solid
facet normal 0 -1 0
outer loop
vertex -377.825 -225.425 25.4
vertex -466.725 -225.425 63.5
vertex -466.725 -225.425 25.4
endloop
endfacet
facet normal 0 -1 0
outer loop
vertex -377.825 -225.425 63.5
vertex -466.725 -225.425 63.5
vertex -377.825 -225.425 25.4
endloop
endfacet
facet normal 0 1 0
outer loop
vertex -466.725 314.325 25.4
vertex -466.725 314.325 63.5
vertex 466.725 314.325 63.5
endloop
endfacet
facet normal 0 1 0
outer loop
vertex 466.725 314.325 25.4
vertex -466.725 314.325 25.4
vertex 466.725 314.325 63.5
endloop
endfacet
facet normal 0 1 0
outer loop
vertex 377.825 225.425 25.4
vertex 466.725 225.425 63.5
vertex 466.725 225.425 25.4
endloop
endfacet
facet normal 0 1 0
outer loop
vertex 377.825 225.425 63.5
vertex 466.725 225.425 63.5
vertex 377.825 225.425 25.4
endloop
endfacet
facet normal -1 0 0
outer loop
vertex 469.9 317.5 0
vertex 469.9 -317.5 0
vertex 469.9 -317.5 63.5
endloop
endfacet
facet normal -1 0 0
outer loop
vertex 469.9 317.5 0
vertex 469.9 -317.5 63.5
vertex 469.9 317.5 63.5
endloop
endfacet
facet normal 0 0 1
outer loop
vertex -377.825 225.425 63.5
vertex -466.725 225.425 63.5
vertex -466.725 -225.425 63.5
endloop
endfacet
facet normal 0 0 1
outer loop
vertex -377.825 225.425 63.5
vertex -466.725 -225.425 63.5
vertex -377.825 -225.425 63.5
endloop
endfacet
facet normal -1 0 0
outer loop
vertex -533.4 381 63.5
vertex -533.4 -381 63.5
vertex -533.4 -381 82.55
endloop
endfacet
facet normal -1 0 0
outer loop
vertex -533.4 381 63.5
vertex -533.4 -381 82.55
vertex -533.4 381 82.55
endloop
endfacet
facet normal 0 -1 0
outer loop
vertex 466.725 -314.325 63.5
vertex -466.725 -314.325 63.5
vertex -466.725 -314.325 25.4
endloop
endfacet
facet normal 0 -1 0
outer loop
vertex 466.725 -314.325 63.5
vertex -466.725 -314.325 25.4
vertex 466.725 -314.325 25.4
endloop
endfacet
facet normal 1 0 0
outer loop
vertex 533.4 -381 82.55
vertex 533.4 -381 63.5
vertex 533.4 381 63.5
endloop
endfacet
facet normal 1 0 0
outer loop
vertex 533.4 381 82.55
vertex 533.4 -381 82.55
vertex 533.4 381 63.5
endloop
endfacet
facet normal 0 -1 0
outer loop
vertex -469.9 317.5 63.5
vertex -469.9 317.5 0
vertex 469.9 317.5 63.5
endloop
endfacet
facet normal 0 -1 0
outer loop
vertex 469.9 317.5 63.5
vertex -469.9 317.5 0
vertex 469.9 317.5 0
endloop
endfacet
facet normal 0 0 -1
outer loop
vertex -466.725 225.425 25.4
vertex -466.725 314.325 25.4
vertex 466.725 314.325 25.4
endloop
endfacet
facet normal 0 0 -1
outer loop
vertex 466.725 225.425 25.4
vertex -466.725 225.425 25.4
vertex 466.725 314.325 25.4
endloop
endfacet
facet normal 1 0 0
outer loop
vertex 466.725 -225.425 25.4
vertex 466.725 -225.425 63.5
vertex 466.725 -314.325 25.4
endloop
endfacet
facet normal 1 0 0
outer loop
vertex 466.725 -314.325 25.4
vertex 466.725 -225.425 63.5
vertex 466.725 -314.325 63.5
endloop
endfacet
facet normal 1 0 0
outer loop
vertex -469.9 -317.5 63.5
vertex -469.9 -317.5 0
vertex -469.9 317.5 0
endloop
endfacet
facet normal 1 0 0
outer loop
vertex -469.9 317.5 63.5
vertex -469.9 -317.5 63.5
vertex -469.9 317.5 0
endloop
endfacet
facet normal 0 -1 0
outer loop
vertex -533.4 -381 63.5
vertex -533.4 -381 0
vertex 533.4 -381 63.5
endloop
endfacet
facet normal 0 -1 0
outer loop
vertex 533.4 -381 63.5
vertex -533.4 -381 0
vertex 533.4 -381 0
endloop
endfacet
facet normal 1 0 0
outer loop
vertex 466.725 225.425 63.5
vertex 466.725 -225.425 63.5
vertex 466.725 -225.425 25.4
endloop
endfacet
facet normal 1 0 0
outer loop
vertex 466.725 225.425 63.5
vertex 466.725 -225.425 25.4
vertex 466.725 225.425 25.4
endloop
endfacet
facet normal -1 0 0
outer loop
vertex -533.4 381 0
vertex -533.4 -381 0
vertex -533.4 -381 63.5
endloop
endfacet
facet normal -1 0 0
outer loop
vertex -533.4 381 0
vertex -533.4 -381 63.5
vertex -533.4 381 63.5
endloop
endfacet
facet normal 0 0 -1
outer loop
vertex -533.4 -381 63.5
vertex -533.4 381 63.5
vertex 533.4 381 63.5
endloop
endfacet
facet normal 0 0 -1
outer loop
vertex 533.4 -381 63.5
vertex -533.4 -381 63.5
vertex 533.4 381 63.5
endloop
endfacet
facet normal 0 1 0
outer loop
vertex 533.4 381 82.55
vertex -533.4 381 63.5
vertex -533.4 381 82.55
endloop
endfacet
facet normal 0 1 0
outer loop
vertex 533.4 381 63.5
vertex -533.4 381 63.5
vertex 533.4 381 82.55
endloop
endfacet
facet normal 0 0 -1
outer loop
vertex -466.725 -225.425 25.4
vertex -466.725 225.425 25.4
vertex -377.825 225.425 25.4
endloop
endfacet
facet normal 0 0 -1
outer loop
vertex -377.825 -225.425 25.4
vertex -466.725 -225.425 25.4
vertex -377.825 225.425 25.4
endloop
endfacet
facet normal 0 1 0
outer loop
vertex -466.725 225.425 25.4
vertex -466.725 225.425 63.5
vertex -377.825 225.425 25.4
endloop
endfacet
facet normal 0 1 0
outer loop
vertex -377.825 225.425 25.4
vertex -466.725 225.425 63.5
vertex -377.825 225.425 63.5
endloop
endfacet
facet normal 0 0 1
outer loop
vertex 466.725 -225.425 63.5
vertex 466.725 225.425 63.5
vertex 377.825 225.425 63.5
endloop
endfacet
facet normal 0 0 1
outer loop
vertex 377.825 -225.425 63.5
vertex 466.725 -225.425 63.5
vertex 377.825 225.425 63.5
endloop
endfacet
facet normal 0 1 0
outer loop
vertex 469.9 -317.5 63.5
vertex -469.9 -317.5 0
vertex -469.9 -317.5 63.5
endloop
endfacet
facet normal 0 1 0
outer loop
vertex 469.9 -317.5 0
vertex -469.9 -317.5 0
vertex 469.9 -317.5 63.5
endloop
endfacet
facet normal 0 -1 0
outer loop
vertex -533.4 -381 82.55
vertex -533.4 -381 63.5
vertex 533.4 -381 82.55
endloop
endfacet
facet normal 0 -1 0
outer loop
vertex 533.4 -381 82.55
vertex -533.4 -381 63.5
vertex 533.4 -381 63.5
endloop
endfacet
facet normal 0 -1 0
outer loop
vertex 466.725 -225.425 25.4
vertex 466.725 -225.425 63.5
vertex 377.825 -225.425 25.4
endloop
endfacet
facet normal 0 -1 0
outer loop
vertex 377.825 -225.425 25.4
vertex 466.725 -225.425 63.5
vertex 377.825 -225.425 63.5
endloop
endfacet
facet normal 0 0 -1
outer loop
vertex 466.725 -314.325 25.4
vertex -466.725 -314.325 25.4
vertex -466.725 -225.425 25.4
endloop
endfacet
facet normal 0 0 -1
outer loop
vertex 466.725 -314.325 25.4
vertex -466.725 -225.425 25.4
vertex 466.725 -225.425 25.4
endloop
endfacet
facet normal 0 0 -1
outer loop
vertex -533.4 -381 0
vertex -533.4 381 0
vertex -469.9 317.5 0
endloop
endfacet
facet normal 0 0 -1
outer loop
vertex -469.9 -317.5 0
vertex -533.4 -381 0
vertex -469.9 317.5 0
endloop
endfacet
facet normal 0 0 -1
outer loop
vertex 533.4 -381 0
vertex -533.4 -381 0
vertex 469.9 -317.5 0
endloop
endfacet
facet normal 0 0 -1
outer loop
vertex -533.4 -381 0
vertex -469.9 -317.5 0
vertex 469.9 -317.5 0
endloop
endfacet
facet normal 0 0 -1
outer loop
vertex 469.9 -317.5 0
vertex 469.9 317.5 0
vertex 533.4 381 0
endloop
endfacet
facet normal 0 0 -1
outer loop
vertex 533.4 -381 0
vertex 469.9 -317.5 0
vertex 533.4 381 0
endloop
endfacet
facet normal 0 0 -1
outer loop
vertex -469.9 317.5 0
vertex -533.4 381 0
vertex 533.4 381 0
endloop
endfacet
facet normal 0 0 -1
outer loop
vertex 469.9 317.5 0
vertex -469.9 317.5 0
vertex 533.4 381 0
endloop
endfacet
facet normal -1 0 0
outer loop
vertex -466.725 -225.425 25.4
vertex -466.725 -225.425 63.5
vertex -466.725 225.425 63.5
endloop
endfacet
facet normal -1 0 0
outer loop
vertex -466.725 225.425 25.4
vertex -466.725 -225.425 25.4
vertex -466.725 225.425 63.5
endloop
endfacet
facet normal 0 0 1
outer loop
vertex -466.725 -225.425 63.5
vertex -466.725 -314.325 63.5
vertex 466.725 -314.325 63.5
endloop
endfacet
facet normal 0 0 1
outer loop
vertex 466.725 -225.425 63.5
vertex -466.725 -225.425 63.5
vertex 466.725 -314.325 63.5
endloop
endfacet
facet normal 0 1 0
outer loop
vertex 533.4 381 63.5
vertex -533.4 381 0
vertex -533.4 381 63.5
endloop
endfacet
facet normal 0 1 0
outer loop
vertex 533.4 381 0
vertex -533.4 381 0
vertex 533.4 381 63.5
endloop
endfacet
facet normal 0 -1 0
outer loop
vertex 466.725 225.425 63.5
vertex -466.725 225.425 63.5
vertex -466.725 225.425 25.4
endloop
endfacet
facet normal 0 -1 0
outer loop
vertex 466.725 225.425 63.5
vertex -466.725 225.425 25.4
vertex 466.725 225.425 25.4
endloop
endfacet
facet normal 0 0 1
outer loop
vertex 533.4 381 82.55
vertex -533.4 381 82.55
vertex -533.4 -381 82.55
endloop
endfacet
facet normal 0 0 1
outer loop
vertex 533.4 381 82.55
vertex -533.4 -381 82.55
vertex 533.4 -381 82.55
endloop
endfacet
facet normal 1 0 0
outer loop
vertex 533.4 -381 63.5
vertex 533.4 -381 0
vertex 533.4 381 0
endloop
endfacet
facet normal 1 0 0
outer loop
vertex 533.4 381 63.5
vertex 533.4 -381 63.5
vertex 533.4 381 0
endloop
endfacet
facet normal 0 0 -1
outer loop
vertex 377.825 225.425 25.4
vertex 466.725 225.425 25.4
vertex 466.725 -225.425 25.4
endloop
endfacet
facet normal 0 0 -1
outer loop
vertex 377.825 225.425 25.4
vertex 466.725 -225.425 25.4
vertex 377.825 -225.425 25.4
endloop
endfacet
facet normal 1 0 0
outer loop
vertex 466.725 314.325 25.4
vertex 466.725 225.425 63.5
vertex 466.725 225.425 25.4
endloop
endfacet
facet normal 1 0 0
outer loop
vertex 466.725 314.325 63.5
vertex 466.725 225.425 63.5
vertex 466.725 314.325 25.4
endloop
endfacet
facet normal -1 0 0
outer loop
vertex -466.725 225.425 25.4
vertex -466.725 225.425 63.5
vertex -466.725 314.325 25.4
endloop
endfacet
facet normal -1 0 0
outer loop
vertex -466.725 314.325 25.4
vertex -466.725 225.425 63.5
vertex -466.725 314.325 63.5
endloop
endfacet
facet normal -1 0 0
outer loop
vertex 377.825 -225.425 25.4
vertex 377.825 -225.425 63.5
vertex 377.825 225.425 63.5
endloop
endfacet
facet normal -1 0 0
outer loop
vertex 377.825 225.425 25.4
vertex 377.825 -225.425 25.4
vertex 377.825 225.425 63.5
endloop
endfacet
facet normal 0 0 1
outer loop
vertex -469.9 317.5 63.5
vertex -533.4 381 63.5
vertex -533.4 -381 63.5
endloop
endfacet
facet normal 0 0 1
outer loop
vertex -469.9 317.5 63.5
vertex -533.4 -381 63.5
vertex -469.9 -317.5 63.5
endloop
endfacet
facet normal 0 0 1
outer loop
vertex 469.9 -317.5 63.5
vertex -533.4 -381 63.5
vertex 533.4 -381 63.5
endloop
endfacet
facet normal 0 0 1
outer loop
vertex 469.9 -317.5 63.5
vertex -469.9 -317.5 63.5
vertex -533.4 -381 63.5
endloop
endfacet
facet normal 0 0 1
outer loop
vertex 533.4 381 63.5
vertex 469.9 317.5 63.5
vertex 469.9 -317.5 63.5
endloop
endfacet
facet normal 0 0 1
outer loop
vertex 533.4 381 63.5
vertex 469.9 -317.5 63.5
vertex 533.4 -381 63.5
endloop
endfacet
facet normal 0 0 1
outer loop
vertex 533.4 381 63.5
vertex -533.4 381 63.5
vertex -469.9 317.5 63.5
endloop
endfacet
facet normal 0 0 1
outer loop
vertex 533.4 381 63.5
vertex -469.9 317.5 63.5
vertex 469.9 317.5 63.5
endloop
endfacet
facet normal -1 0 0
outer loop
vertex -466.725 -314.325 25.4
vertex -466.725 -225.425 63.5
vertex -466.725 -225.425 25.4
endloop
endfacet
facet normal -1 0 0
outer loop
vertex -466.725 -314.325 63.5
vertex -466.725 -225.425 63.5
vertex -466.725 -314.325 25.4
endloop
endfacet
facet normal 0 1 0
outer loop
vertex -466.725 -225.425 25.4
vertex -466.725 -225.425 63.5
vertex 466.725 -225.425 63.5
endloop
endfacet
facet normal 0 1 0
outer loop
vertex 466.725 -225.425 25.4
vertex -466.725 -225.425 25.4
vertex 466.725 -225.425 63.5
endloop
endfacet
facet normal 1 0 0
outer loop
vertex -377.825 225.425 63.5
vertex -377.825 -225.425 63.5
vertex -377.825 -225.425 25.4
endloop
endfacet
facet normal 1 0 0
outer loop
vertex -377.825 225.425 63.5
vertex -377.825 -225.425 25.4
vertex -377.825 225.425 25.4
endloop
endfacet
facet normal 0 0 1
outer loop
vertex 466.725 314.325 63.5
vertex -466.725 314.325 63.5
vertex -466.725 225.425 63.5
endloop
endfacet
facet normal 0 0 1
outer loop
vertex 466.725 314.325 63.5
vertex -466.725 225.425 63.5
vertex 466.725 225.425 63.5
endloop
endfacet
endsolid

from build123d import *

# Parameters (mm, degrees)
F0_W     = 1066.8
F0_H     = 762
F0_W_2   = 939.8
F0_H_2   = 635
F1_DEPTH = 63.5
F2_W     = 933.45
F2_H     = 88.9
F3_DEPTH = 38.1
F5_W     = 88.9
F5_H     = 450.85
F6_DEPTH = 38.1
F8_W     = 1066.8
F8_H     = 762
F9_DEPTH = 19.05


with BuildPart() as f1:
    # F0 (on Top) → F1 (new body)
    with BuildSketch(Plane.XY):
        Rectangle(F0_W, F0_H)
        Rectangle(F0_W_2, F0_H_2, mode=Mode.SUBTRACT)
    extrude(amount=F1_DEPTH)


with BuildPart() as f3:
    # F2 (on face) → F3 (new body)
    with BuildSketch(Plane.XY.offset(63.5)):
        with Locations((0, 269.875)):
            Rectangle(F2_W, F2_H)
    extrude(amount=-F3_DEPTH)


with BuildPart() as f4_1:
    # F4: instance of F3
    add(f3.part.mirror(Plane.XZ))


with BuildPart() as f6:
    # F5 (on face) → F6 (new body)
    with BuildSketch(Plane.XY.offset(63.5)):
        with Locations((-422.275, 0)):
            Rectangle(F5_W, F5_H)
    extrude(amount=-F6_DEPTH)


with BuildPart() as f7_1:
    # F7: instance of F6
    add(f6.part.mirror(Plane.YZ))


with BuildPart() as f9:
    # F8 (on face) → F9 (new body)
    with BuildSketch(Plane.XY.offset(63.5)):
        Rectangle(F8_W, F8_H)
    extrude(amount=F9_DEPTH)


solid = Compound([f1.part, f3.part, f4_1.part, f6.part, f7_1.part, f9.part])
